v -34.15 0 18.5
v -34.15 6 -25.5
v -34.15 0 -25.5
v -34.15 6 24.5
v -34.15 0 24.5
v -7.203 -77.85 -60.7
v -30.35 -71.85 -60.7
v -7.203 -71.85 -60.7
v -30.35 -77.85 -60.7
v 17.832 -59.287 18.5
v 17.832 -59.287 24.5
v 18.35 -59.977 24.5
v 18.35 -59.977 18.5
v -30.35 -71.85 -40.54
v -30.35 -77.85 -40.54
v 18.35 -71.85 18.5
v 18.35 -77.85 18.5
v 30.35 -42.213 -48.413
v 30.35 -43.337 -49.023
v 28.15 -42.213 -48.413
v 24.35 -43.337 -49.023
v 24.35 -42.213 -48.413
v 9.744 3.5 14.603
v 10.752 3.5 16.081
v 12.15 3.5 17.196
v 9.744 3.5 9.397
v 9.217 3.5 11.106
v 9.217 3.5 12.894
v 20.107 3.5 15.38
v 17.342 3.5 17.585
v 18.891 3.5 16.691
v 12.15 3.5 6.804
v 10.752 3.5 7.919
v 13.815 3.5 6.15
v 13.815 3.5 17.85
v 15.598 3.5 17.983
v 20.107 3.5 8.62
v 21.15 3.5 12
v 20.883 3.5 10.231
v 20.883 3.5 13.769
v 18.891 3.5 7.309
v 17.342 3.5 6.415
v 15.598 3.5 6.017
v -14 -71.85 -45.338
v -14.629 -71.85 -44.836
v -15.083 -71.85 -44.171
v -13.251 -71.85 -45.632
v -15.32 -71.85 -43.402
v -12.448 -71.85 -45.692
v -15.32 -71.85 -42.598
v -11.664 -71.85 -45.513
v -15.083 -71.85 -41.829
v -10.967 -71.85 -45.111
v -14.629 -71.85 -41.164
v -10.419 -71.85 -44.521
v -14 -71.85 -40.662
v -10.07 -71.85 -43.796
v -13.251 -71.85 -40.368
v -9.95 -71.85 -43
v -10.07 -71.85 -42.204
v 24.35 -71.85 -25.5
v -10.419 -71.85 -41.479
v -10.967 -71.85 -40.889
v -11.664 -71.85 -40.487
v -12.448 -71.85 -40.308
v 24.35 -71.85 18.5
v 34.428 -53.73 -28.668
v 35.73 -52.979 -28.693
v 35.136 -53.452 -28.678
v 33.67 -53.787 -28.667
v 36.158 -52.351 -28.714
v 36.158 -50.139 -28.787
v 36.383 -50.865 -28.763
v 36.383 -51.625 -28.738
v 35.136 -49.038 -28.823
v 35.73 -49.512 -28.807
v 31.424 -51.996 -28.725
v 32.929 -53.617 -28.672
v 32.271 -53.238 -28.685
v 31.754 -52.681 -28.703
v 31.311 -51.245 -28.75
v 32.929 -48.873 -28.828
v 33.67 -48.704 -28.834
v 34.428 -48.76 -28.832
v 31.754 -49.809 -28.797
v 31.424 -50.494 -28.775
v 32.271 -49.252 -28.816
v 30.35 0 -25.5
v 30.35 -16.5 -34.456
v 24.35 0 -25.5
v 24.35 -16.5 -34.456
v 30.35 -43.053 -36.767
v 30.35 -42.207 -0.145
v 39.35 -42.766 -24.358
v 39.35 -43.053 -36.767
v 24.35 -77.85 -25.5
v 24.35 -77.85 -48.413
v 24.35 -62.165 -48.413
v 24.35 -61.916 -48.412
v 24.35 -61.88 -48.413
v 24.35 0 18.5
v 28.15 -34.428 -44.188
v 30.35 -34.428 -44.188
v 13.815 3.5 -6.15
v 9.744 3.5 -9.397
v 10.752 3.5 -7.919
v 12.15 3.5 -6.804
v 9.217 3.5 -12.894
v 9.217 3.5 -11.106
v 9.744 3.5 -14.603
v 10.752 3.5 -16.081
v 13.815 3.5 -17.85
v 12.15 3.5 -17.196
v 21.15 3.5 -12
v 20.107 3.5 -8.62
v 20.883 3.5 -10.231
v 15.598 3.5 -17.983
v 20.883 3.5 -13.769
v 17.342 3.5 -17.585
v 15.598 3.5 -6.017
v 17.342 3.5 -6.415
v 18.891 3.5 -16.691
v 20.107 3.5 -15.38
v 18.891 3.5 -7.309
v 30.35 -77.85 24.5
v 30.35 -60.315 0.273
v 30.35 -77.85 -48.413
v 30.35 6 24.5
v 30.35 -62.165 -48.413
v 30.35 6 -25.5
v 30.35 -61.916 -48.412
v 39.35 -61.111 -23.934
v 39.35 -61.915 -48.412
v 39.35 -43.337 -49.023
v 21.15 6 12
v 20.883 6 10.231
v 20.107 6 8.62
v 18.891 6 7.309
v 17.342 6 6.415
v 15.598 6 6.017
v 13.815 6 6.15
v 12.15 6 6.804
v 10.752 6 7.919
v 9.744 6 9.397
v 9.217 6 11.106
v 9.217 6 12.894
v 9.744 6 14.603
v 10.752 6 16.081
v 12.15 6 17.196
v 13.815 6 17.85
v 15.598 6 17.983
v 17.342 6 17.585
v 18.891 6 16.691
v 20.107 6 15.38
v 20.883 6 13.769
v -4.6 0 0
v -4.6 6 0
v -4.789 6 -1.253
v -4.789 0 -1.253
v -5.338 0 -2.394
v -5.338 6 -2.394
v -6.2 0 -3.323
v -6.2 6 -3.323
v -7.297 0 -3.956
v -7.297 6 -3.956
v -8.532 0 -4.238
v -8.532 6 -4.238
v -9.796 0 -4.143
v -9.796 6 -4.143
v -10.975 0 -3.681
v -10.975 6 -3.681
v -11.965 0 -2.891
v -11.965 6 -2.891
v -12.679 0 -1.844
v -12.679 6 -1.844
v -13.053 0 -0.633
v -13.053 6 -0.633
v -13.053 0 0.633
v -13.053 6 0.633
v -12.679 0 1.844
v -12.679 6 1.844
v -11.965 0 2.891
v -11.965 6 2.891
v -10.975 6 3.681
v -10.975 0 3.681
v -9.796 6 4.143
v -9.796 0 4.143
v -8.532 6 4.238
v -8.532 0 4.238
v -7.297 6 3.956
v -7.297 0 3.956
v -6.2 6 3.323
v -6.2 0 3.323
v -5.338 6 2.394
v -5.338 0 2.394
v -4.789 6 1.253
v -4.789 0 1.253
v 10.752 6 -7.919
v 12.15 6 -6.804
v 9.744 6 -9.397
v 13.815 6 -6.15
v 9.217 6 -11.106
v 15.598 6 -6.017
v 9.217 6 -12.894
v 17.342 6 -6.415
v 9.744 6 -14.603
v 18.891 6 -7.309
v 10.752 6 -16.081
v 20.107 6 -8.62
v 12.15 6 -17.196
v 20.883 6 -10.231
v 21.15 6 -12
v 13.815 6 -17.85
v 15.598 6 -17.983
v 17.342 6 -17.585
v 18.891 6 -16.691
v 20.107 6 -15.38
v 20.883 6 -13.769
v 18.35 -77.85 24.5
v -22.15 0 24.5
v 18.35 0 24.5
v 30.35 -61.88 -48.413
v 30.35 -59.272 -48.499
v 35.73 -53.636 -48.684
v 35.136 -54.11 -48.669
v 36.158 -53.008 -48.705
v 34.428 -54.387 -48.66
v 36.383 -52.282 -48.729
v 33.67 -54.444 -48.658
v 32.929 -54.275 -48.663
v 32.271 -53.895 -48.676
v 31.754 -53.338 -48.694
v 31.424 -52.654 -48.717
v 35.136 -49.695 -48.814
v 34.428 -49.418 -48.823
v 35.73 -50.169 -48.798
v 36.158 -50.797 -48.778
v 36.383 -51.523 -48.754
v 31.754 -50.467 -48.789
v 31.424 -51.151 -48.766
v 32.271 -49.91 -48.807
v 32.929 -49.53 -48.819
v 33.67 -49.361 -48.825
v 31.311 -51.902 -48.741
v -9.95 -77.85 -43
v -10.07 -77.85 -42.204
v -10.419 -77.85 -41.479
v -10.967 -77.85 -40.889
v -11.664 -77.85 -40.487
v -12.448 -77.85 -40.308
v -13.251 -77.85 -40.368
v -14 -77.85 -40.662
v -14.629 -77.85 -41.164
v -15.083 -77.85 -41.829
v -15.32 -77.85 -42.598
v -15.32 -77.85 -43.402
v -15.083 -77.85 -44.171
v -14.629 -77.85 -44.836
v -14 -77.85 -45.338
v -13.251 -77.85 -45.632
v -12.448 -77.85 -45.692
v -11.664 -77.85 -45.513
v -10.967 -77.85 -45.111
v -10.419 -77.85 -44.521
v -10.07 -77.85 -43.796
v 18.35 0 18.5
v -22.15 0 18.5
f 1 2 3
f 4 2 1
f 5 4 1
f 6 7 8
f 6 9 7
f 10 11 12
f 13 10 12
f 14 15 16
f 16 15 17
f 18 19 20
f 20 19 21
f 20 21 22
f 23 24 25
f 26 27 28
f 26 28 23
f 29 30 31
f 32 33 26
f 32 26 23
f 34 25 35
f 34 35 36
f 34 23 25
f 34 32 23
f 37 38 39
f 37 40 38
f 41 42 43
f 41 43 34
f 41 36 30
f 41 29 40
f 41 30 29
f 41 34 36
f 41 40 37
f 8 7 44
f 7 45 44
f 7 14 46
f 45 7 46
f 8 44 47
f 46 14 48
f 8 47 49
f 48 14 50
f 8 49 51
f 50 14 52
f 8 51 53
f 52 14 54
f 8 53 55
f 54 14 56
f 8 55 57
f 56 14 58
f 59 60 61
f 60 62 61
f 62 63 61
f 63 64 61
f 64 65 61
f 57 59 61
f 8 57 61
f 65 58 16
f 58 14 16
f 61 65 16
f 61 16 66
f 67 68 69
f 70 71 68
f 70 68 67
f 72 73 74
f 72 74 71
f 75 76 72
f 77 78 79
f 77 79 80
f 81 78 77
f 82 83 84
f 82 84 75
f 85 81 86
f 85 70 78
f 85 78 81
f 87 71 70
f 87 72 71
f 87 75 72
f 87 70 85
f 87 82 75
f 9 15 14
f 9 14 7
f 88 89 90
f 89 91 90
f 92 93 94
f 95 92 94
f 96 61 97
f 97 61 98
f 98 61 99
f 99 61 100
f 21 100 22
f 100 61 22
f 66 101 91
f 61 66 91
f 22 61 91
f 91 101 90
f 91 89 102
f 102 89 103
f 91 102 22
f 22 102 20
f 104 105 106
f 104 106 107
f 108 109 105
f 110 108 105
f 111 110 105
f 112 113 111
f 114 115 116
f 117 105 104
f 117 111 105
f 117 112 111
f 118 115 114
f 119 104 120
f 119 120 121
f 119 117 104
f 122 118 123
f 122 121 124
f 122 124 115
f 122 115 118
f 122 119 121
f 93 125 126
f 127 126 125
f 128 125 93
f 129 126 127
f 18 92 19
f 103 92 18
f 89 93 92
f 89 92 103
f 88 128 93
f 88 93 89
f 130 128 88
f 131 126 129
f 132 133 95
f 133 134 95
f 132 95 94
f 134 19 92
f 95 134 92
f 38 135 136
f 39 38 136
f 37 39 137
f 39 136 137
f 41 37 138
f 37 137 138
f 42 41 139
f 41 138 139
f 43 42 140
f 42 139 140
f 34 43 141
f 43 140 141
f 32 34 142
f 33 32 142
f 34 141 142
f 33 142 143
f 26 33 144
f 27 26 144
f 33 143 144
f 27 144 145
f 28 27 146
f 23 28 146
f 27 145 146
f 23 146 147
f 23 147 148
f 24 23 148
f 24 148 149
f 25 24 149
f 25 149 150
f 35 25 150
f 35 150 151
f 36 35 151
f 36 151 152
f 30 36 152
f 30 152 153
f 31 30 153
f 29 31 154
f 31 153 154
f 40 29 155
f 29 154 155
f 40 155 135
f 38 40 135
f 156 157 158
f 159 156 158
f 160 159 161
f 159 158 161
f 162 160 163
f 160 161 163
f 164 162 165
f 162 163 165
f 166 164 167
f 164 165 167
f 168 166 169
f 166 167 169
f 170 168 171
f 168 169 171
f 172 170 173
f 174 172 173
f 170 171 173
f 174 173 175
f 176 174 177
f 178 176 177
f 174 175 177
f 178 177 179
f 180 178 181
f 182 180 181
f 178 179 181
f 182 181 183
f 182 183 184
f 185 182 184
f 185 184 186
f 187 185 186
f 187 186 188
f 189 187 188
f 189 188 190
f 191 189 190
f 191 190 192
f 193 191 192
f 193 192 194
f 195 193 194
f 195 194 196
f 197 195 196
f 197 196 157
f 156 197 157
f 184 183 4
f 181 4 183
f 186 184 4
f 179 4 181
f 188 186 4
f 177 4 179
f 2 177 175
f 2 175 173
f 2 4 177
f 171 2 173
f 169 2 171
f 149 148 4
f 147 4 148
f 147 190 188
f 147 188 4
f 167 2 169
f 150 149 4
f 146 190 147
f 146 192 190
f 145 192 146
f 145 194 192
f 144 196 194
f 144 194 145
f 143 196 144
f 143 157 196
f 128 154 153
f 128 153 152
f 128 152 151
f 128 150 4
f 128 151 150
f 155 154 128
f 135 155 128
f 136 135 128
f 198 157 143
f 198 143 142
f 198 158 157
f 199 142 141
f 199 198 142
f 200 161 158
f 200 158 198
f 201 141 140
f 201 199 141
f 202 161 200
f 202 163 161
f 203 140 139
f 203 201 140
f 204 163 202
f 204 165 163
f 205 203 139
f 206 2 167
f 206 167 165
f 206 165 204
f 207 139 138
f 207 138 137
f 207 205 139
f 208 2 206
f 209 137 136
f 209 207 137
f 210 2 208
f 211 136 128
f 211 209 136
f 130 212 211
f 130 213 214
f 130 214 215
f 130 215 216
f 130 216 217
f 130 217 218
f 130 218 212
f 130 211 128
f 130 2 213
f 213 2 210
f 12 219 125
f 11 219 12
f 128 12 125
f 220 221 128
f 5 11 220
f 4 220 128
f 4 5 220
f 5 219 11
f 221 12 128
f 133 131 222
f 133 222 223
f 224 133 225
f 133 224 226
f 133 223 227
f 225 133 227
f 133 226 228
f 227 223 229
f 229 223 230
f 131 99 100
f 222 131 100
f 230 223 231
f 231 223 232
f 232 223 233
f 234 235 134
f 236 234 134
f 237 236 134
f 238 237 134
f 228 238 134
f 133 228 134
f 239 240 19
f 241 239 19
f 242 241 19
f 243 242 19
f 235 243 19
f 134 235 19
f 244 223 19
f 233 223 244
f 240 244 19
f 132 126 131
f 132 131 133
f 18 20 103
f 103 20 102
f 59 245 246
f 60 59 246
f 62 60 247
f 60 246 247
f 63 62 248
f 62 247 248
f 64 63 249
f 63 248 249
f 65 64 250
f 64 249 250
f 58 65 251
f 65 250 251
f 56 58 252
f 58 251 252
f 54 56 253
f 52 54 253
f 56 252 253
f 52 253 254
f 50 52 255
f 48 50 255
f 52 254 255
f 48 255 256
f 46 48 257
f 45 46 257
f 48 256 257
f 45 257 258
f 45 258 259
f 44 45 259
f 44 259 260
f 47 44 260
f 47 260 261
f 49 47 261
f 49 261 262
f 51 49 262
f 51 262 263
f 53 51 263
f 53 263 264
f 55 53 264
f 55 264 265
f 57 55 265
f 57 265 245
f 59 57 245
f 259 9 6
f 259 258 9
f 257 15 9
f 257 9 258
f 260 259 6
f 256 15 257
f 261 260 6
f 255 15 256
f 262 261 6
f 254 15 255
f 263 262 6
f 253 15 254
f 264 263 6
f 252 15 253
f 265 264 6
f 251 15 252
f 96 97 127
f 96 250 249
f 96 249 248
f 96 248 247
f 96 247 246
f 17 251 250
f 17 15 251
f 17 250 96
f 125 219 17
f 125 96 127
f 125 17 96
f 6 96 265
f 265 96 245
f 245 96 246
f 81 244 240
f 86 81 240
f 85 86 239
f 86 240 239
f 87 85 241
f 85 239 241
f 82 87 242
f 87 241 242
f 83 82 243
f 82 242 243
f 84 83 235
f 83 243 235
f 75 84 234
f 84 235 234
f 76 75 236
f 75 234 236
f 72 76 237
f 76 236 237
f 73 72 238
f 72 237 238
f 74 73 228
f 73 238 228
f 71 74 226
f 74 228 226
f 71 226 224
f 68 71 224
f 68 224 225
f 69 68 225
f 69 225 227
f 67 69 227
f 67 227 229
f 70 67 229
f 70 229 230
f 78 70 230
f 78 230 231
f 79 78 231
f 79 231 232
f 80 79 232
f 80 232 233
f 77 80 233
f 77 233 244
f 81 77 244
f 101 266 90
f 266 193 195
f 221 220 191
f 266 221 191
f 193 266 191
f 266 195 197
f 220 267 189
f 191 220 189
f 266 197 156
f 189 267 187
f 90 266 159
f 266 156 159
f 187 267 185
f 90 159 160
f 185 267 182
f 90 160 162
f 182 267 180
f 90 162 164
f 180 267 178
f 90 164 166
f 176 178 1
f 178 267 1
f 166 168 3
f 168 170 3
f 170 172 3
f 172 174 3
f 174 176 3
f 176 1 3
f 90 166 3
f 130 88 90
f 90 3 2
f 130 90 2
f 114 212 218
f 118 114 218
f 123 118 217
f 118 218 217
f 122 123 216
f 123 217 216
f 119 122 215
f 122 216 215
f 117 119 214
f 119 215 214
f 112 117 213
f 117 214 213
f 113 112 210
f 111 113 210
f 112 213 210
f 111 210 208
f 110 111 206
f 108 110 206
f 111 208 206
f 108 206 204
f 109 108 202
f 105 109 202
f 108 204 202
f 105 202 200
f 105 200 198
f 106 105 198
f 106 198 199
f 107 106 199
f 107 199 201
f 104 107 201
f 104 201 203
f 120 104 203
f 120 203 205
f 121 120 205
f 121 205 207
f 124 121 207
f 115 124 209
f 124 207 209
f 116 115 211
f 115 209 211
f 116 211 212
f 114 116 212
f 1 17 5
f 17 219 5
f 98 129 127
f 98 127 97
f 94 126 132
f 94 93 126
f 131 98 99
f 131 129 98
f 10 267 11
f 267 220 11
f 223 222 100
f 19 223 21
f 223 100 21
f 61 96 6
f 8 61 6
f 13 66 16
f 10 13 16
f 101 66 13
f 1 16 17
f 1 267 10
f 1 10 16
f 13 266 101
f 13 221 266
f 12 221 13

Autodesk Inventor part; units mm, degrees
ref_plane "YZ Plane" through (0, 0, 0) normal (1, 0, 0) x (0, 1, 0)
ref_plane "XZ Plane" through (0, 0, 0) normal (0, 1, 0) x (-1, 0, 0)
ref_plane "XY Plane" through (0, 0, 0) normal (0, 0, 1) x (1, 0, 0)
sketch "Sketch1" plane through (0, 0, 0) normal (0, 1, 0) x (-1, 0, 0)
  line L0 (0, -25.5) -> (-34.15, -25.5)
  line L1 (-34.15, -25.5) -> (-34.15, 0)
  line L2 (-34.15, 0) -> (-34.15, 25.5)
  line L3 (-34.15, 25.5) -> (0, 25.5)
  line L4 (0, 25.5) -> (34.15, 25.5)
  line L5 (34.15, 25.5) -> (34.15, 0)
  line L6 (34.15, 0) -> (34.15, -25.5)
  line L7 (34.15, -25.5) -> (0, -25.5)
  point P0 (0, 0)
extrude "Extrusion1" add sketch "Sketch1" along normal blind 7
sketch "Sketch3" plane through (-34.15, 0, 25.5) normal (0, 0, 1) x (1, 0, 0)
  line L0 (0, 0) -> (0, -78.85)
  point P0 (34.15, 0)
  dimension "d7" = 78.85
sketch "Sketch4" plane through (-34.15, 0, -25.5) normal (-1, 0, 0) x (0, 0, 1)
  line L0 (51, 0) -> (51, -78.85)
  line L1 (51, -78.85) -> (-39, -78.85)
  line L2 (-39, -78.85) -> (-39, -71.85)
  line L3 (0, 0) -> (-39, -71.85)
  line L4 (0, 0) -> (51, 0)
  point P0 (25.5, 0)
  dimension "d10" = 90
  dimension "d11" = 7
extrude "Extrusion2" add sketch "Sketch4" against normal blind 7
sketch "Sketch7" plane through (-27.15, 0, -25.5) normal (1, 0, 0) x (0, 0, -1)
  line L0 (-51, -78.85) -> (39, -78.85) projected
  line L1 (-51, -78.85) -> (39, -78.85)
  line L2 (39, -78.85) -> (39, -71.85) projected
  line L3 (39, -78.85) -> (39, -71.85)
  line L4 (39, -71.85) -> (-51, -71.85)
  line L5 (-51, 0) -> (-51, -78.85) projected
  line L6 (-51, -78.85) -> (-51, -71.85)
  point P0 (-25.5, 0)
sketch "Sketch8" plane through (0, 0, 0) normal (0, -1, 0) x (1, 0, 0)
  circle A0 centre (8.15, 0) radius 5 projected
  line L0 (8.15, 18.5) -> (34.15, 18.5)
  line L1 (34.15, 25.5) -> (34.15, -25.5) projected
  line L2 (8.15, 25.5) -> (34.15, 25.5)
  line L3 (8.15, 25.5) -> (-27.15, 25.5)
  line L4 (-27.15, 25.5) -> (-27.15, -25.5) projected
  line L5 (8.15, 18.5) -> (-27.15, 18.5)
  line L6 (34.15, 25.5) -> (34.15, 18.5)
  line L7 (-27.15, 25.5) -> (-27.15, 18.5)
  point P0 (0, 0)
extrude "Extrusion6" add sketch "Sketch7" along normal blind 58.5
extrude "Extrusion7" add sketch "Sketch8" along normal blind 78.75 contours L5 L4 L3 L2 L1 L0
sketch "Sketch9" plane through (31.35, 0, -25.5) normal (1, 0, 0) x (0, 0, -1)
  line L0 (-51, -78.75) -> (-51, 7) projected
  line L1 (-44, 0) -> (-44, -71.85) projected
  line L2 (-51, -78.75) -> (-44, -78.75)
  line L3 (-44, -78.75) -> (-44, -71.85)
  line L4 (-44, -71.85) -> (-51, -71.85)
  line L5 (-51, -71.85) -> (-51, -78.75)
  point P0 (-25.5, 0)
extrude "Extrusion8" cut sketch "Sketch9" along normal blind 10
sketch "Sketch10" plane through (0, 7, 0) normal (0, 1, 0) x (1, 0, 0)
  point P0 (0, 0)
sketch "Boceto11" plane through (-34.15, -78.85, -64.5) normal (0, -1, 0) x (1, 0, 0)
  line L0 (0, 0) -> (65.5, 0) projected
  line L1 (65.5, 89.9985) -> (65.5, 0)
  line L2 (65.5, 0) -> (71.065, 0)
  line L3 (71.065, 0) -> (71.065, 89.9985)
  line L4 (71.065, 89.9985) -> (65.5, 89.9985)
  line L5 (65.5, 89.9985) -> (65.5, 95.8996)
  line L6 (65.5, 95.8996) -> (71.065, 89.9985)
  point P0 (34.15, 64.5)
extrude "Extrusión9" cut sketch "Boceto11" against normal blind 100
sketch "Boceto12" plane through (31.35, 0, -25.5) normal (1, 0, 0) x (0, 0, -1)
  line L0 (-44, 0) -> (-44, -71.85) projected
  line L1 (-44, 0) -> (-44, -71.85)
  line L2 (39, -71.85) -> (39, -78.85) projected
  line L3 (-44, -71.85) -> (39, -71.85)
  line L4 (-44, 0) -> (0, 0) projected
  line L5 (39, -71.85) -> (0, 0)
  line L6 (0, 0) -> (-44, 0)
  point P0 (-25.5, 0)
extrude "Extrusión10" add sketch "Boceto12" against normal blind 7
sketch "Boceto13" plane through (-34.15, 7, -25.5) normal (-1, 0, 0) x (0, 0, 1)
  line L0 (0, -7) -> (0, 0) projected
  line L1 (44, -7) -> (0, -7) projected
  line L2 (0, -7) -> (44, -7)
  line L3 (44, -78.85) -> (-39, -78.85) projected
  line L4 (44, -7) -> (44, -78.85)
  line L5 (44, -78.85) -> (-39, -78.85)
  line L6 (-39, -78.85) -> (0, -7)
  point P0 (25.5, -7)
extrude "Extrusión11" cut sketch "Boceto13" against normal blind 7
sketch "Boceto15" plane through (-34.15, 0, -25.5) normal (0, 0, -1) x (-1, 0, 0)
  point P0 (-34.15, 0)
sketch "Boceto19" plane through (-34.15, -78.85, -64.5) normal (0, -1, 0) x (1, 0, 0)
  line L0 (65.5, 90) -> (65.5, 0) projected
  line L1 (65.5, 0) -> (65.5, 40.9323)
  line L2 (81.7334, 40.9323) -> (65.5, 40.9323)
  line L3 (81.7334, 40.9323) -> (81.7334, 0)
  line L4 (81.7334, 0) -> (65.5, 0)
  point P0 (34.15, 64.5)
extrude "Extrusión17" cut sketch "Boceto19" against normal blind 100
sketch "Boceto20" plane through (24.35, 0, -25.5) normal (-1, 0, 0) x (0, 0, 1)
  line L0 (-29.1839, -53.7657) -> (-27.9516, -53.3206) projected
  line L1 (0, 0) -> (-39, -71.85) projected
  line L2 (-29.1839, -53.7657) -> (-27.8697, -51.3447)
  line L3 (-27.8697, -51.3447) -> (-27.9516, -53.3206) projected
  line L4 (-27.8697, -51.3447) -> (-27.9516, -53.3206)
  line L5 (-27.9516, -53.3206) -> (-29.1839, -53.7657)
  point P0 (25.5, 0)
extrude "Extrusión18" add sketch "Boceto20" against normal blind 7
sketch "Boceto21" plane through (24.35, 0, -25.5) normal (-1, 0, 0) x (0, 0, 1)
  point P0 (25.5, 0)
sketch "Boceto22" plane through (24.35, 0, -25.5) normal (-1, 0, 0) x (0, 0, 1)
  point P0 (25.5, 0)
sketch "Boceto24" plane through (31.35, 0, -25.5) normal (1, 0, 0) x (0, 0, -1)
  point P0 (-25.5, 0)
sketch "Boceto26" plane through (24.35, 0, -25.5) normal (-1, 0, 0) x (0, 0, 1)
  point P0 (25.5, 0)
sketch "Boceto27" plane through (31.35, 0, -25.5) normal (1, 0, 0) x (0, 0, -1)
  line L0 (-51, 7) -> (0, 7) projected
  line L1 (0, 7) -> (16.0227, 7)
  line L2 (16.0227, 7) -> (16.0227, -29.5187)
  line L3 (0, 0) -> (39, -71.85) projected
  line L4 (16.0227, -29.5187) -> (0, 0)
  line L5 (0, 0) -> (0, 7)
  point P0 (-25.5, 0)
extrude "Extrusión22" add sketch "Boceto27" against normal blind 7
sketch "Boceto28" plane through (24.35, 0, -25.5) normal (-1, 0, 0) x (0, 0, 1)
  line L0 (-16.0227, -29.5187) -> (-39, -71.85) projected
  line L1 (-16.0227, -29.5187) -> (0, 0)
  line L2 (0, 7) -> (-16.0227, 7) projected
  line L3 (0, 0) -> (0, 7)
  line L4 (0, 7) -> (-16.0227, 7)
  line L5 (-16.0227, 7) -> (-16.0227, -29.5187) projected
  line L6 (-16.0227, 7) -> (-16.0227, -29.5187)
  point P0 (25.5, 0)
extrude "Extrusión23" cut sketch "Boceto28" against normal blind 7
sketch "Boceto29" plane through (31.35, 0, -25.5) normal (1, 0, 0) x (0, 0, -1)
  point P0 (-25.5, 0)
sketch "Boceto31" plane through (-34.15, -78.85, -64.5) normal (0, 0, -1) x (-1, 0, 0)
  line L0 (0, 7) -> (0, 0) projected
  line L1 (0, 0) -> (0, 1)
  line L2 (0, 1) -> (-65.5, 1)
  line L3 (-65.5, 0) -> (-65.5, 85.85) projected
  line L4 (-65.5, 1) -> (-64.5, 1)
  line L5 (-64.5, 1) -> (-64.5, 85.85)
  line L6 (0, 85.85) -> (-65.5, 85.85) projected
  line L7 (-64.5, 85.85) -> (0, 85.85)
  line L8 (0, 85.85) -> (0, 84.85)
  line L9 (0, 0) -> (0, 85.85) projected
  line L10 (0, 84.85) -> (-64.5, 84.85)
  line L11 (-64.5, 85.85) -> (-65.5, 85.85)
  line L12 (0, 0) -> (-65.5, 0) projected
  line L13 (-65.5, 85.85) -> (-65.5, 0)
  line L14 (-65.5, 0) -> (0, 0)
  point P0 (-34.15, 78.85)
  dimension "d84" = 1
  dimension "d85" = 1
  dimension "d86" = 1
extrude "Extrusión26" cut sketch "Boceto31" against normal blind 1000 contours L0 L12 L3 L2 | L10 L5 L6 L8 | L2 L3 L6 L5
sketch "Boceto32" plane through (-34.15, -71.85, 18.5) normal (-1, 0, 0) x (0, 0, 1)
  line L0 (-83, -6) -> (7, -6) projected
  line L1 (7, -6) -> (6, -6)
  line L2 (6, -6) -> (6, 77.85)
  line L3 (7, 77.85) -> (-44, 77.85) projected
  line L4 (7, -6) -> (7, 77.85) projected
  line L5 (6, 77.85) -> (7, 77.85)
  line L6 (7, 77.85) -> (7, -6)
  point P0 (-18.5, 71.85)
  dimension "d89" = 1
extrude "Extrusión27" cut sketch "Boceto32" against normal blind 100
sketch "Boceto33" plane through (-34.15, 6, -25.5) normal (0, 1, 0) x (1, 0, 0)
  line L0 (0, 0) -> (0, -44) projected
  line L1 (0, 0) -> (0, -25.5)
  line L2 (0, -25.5) -> (25.3, -25.5)
  circle A0 centre (25.3, -25.5) radius 4.25
  point P0 (34.15, -25.5)
  dimension "d92" = 25.5
  dimension "d93" = 25.3
  dimension "d94" = 8.5
extrude "Extrusión28" cut sketch "Boceto33" against normal blind 10
sketch "Boceto34" plane through (30.35, -77.85, -64.5) normal (1, 0, 0) x (0, 0, -1)
  point P0 (-64.5, 77.85)
sketch "Boceto35" plane through (30.35, -77.85, -64.5) normal (1, 0, 0) x (0, 0, -1)
  circle A0 centre (-24.4828, 41.285) radius 2.6
  point P0 (-64.5, 77.85)
  dimension "d101" = 5.2
extrude "Extrusión29" cut sketch "Boceto35" against normal blind 10
sketch "Boceto36" plane through (30.35, -77.85, -64.5) normal (1, 0, 0) x (0, 0, -1)
  point P0 (-64.5, 77.85)
sketch "Boceto37" plane through (30.35, -77.85, -64.5) normal (1, 0, 0) x (0, 0, -1)
  line L0 (-39, 77.85) -> (0, 6) projected
  line L1 (-12.3437, 28.741) -> (-12.3437, 48.1268)
  line L2 (-12.3437, 48.1268) -> (-28.4038, 58.3285)
  line L3 (-12.3437, 28.741) -> (-28.4038, 58.3285)
  point P0 (-64.5, 77.85)
extrude "Extrusión30" add sketch "Boceto37" against normal blind 6
fillet "Empalme3" radius 10 3 edges at (27.35, -29.7232, -52.1563) (27.35, -49.109, -52.1563) (27.35, -19.5215, -36.0962)
sketch "Boceto38" plane through (30.35, -77.85, -64.5) normal (1, 0, 0) x (0, 0, -1)
  point P0 (-64.5, 77.85)
sketch "Boceto39" plane through (30.35, -77.85, -64.5) normal (1, 0, 0) x (0, 0, -1)
  line L0 (-6.8274, 18.5782) -> (-18.8698, 18.5782)
  line L1 (-18.8698, 18.5782) -> (-18.2969, 35.7502)
  line L2 (-18.2969, 35.7502) -> (-20.685, 39.2299)
  line L3 (-20.685, 39.2299) -> (-19.4909, 52.6668)
  line L4 (-26.2143, 56.9377) -> (-16.9818, 51.073) projected
  line L5 (-6.8274, 18.5782) -> (-5.5662, 48.0514)
  line L6 (-5.5662, 48.0514) -> (-19.4909, 52.6668)
  point P0 (-64.5, 77.85)
extrude "Extrusión31" cut sketch "Boceto39" against normal blind 2.2
fillet "Empalme4" radius 10 1 edges at (29.25, -25.1832, -45.0091)
sketch "Boceto40" plane through (24.35, 0, -25.5) normal (-1, 0, 0) x (0, 0, 1)
  line L0 (-26.6563, -35.218) -> (-26.6563, -46.57) projected
  line L1 (-26.6563, -35.218) -> (-24.0221, -30.4862) construction
  arc A0 (-12.7857, -20.9123) -> (-9.3588, -17.2419) centre (-18.1476, -12.4713) ccw projected
  line L2 (-24.0221, -30.4862) -> (-10.7107, -19.1566) construction
  spline S0 degree 2 poles (-26.6563, -35.218) (-24.0221, -30.4862) (-10.7107, -19.1566) knots 1 1 1 2 2 2
  line L3 (-26.6563, -35.218) -> (-10.7107, -35.218)
  line L4 (-10.7107, -35.218) -> (-10.7107, -19.1566)
  line L5 (-10.7107, -19.1566) -> (-26.6563, -19.1566)
  line L6 (-26.6563, -19.1566) -> (-26.6563, -35.218)
  point P0 (25.5, 0)
  point P1 (-10.7107, -19.1566)
extrude "Extrusión32" cut sketch "Boceto40" against normal blind 6 contours S0 L6 L5
fillet "Empalme5" radius 10 1 edges at (26.25, -35.218, -52.1563)
sketch "Boceto41" plane through (-34.15, -71.85, 18.5) normal (0, 1, 0) x (1, 0, 0)
  circle A0 centre (11.5, 71.5) radius 5 projected
  circle A1 centre (11.5, 71.5) radius 6
  line L0 (11.5, 71.5) -> (-12.5, 71.5)
  line L1 (-12.5, 71.5) -> (-12.5, 95.5)
  line L2 (-12.5, 95.5) -> (11.5, 95.5)
  line L3 (11.5, 95.5) -> (11.5, 71.5)
  line L4 (64.5, 76.1726) -> (64.5, 83) projected
  line L5 (64.5, 83) -> (64.5, 95.5)
  line L6 (64.5, 95.5) -> (11.5, 95.5)
  line L7 (0, 83) -> (0, -6) projected
  line L8 (0, -6) -> (-12.5, -6)
  line L9 (-12.5, -6) -> (-12.5, 71.5)
  line L10 (64.5, 83) -> (11.5, 83)
  line L11 (0, 83) -> (58.5, 83) projected
  point P0 (34.15, 18.5)
  dimension "d113" = 12
  dimension "d114" = 24
  dimension "d115" = 24
extrude "Extrusión33" add sketch "Boceto41" against normal blind 6 contours L11 L7 L0 L1 L2 L3 | L3 L6 L5 L10 | L7 L8 L9 L0
sketch "Boceto43" plane through (30.35, 6, 24.5) normal (0, 1, 0) x (1, 0, 0)
  circle A0 centre (-39.2, 24.5) radius 4.25 projected
  line L0 (-39.2, 24.5) -> (-15.2, 24.5)
  line L1 (-15.2, 24.5) -> (-15.2, 12.5)
  line L2 (-15.2, 12.5) -> (-15.2, 36.5)
  circle A1 centre (-15.2, 36.5) radius 6
  circle A2 centre (-15.2, 12.5) radius 6
  point P0 (-30.35, 24.5)
  dimension "d123" = 24
  dimension "d124" = 12
  dimension "d125" = 24
  dimension "d126" = 12
  dimension "d127" = 12
extrude "Extrusión35" cut sketch "Boceto43" against normal blind 2.5 contours A1 | A2
sketch "Boceto44" plane through (24.35, 0, -25.5) normal (-1, 0, 0) x (0, 0, 1)
  line L0 (0, 0) -> (-9.3588, -17.2419) projected
  line L1 (-9.3588, -17.2419) -> (-30.5215, -33.5874)
  line L2 (-30.5215, -33.5874) -> (-30.5215, -56.2301)
  line L3 (-27.8675, -51.3405) -> (-39, -71.85) projected
  arc A0 (-12.666, -20.8351) -> (-9.3588, -17.2419) centre (-18.1476, -12.4713) ccw projected
  line L4 (-30.5215, -56.2301) -> (-9.3588, -17.2419)
  point P0 (25.5, 0)
extrude "Extrusión36" add sketch "Boceto44" against normal blind 6
sketch "Boceto45" plane through (30.35, 0, -25.5) normal (1, 0, 0) x (0, 0, -1)
  line L0 (18.315, -38.6201) -> (18.6875, -34.4282) projected
  line L1 (18.6875, -34.4282) -> (19.9402, -25.4146)
  line L2 (9.3588, -17.2419) -> (30.5215, -33.5874) projected
  line L3 (30.5215, -56.2301) -> (30.5215, -33.5874) projected
  line L4 (19.9402, -25.4146) -> (30.5215, -33.5874)
  line L5 (30.5215, -33.5874) -> (32.1519, -59.2336)
  line L6 (30.5215, -56.2301) -> (39, -71.85) projected
  line L7 (32.1726, -59.2718) -> (20.1302, -59.2718) projected
  line L8 (32.1726, -59.2718) -> (18.315, -38.6201)
  point P0 (-25.5, 0)
extrude "Extrusión37" cut sketch "Boceto45" against normal blind 2.2 contours L0 L1 L2 L3 L6 L8
fillet "Empalme7" radius 4 3 edges at (26.25, -33.5874, -56.0215) (27.35, -17.2419, -34.8588) (26.25, -56.2301, -56.0215)
sketch "Boceto46" plane through (-34.15, -71.85, 18.5) normal (0, 1, 0) x (1, 0, 0)
  line L0 (-12.5, -6) -> (0, -6) projected
  line L1 (0, -6) -> (0, 95.5)
  line L2 (-12.5, 95.5) -> (64.5, 95.5) projected
  line L3 (0, 95.5) -> (-12.5, 95.5)
  line L4 (-12.5, 95.5) -> (-12.5, -6)
  line L5 (-12.5, -6) -> (0, -6)
  point P0 (34.15, 18.5)
extrude "Extrusión38" cut sketch "Boceto46" against normal blind 10
sketch "Boceto47" plane through (-34.15, -71.85, 18.5) normal (0, 1, 0) x (1, 0, 0)
  line L0 (0, 0) -> (0, -6) projected
  line L1 (0, 95.5) -> (26.5, 95.5)
  line L2 (26.5, 95.5) -> (26.5, 69)
  line L3 (26.5, 69) -> (0, 69)
  line L4 (0, 69) -> (0, 95.5)
  circle A0 centre (26.5, 69) radius 6
  point P0 (34.15, 18.5)
  dimension "d137" = 26.5
  dimension "d138" = 26.5
  dimension "d139" = 12
extrude "Extrusión39" cut sketch "Boceto47" against normal blind 10 contours A0 L3 L2 | L2 L3 A0
sketch "Sketch48" plane through (-34.15, -71.85, 18.5) normal (0, 1, 0) x (1, 0, 0)
  circle A0 centre (26.5, 69) radius 6 projected
  line L0 (29.7126, 74.0675) -> (26.5, 69)
  circle A1 centre (26.5, 69) radius 18
  line L1 (8.5, 69) -> (8.5, 0)
  line L2 (0, 0) -> (58.5, 0) projected
  line L3 (0, 0) -> (8.5, 0)
  line L4 (26.5, 87) -> (64.5, 87)
  line L5 (64.5, 83) -> (64.5, 95.5) projected
  line L6 (0, 0) -> (0, 95.5) projected
  line L7 (64.5, 95.5) -> (0, 95.5)
  line L8 (0, 95.5) -> (0, 0)
  point P0 (34.15, 18.5)
  dimension "d142" = 36
extrude "Extrusion40" cut sketch "Sketch48" against normal blind 10 contours A1 L1 L2 L6 L7 L5 L4
sketch "Sketch49" plane through (24.35, 0, 18.5) normal (0, 0, -1) x (-1, 0, 0)
  line L0 (58.5, -77.85) -> (50, -77.85) projected
  line L1 (58.5, -77.85) -> (50, -77.85)
  line L2 (50, -71.85) -> (0, -71.85) projected
  line L3 (50, -77.85) -> (50, -71.85)
  line L4 (50, -71.85) -> (58.5, -71.85)
  line L5 (58.5, -71.85) -> (58.5, -77.85)
  point P0 (24.35, 0)
extrude "Extrusion41" add sketch "Sketch49" along normal blind 20
fillet "Fillet8" radius 7 1 edges at (-34.15, -74.85, -1.5)
fillet "Fillet9" radius 2 1 edges at (-25.65, -74.85, -1.5)
sketch "Sketch50" plane through (28.15, -77.85, -64.5) normal (1, 0, 0) x (0, 0, -1)
  point P0 (-64.5, 77.85)
sketch "Sketch51" plane through (-34.15, -77.85, 24.5) normal (0, -1, 0) x (1, 0, 0)
  line L0 (64.5, -50) -> (64.5, 0) projected
  line L1 (64.5, 0) -> (-39.5, 0)
  line L2 (-39.5, 0) -> (-39.5, -120)
  line L3 (-39.5, -120) -> (64.5, -120)
  line L4 (64.5, -120) -> (64.5, 0)
  point P0 (34.15, -24.5)
  dimension "d149" = 104
  dimension "d150" = 120
sketch "Sketch52" plane through (30.35, 0, -25.5) normal (1, 0, 0) x (0, 0, -1)
  line L0 (0, 0) -> (-44, 0) projected
  line L1 (32.1726, -59.2718) -> (39, -71.85) projected
  line L2 (0, 0) -> (39, -71.85)
  line L3 (22.9041, -62.1597) -> (23.523, -43.3366)
  line L4 (22.9041, -62.1597) -> (39, -71.85)
  line L5 (39, -71.85) -> (32.1726, -12.8018)
  line L6 (0, 0) -> (0, 6) projected
  line L7 (32.1726, -12.8018) -> (0, 0)
  point P0 (-25.5, 0)
extrude "Extrusion42" cut sketch "Sketch52" against normal blind 10
sketch "Sketch53" plane through (28.15, -77.85, -64.5) normal (1, 0, 0) x (0, 0, -1)
  line L0 (-16.0959, 15.6903) -> (0, 6) projected
  line L1 (-16.001, 18.5782) -> (-15.477, 34.5134) projected
  line L2 (-16.0959, 15.6903) -> (-15.477, 34.5134)
  line L3 (-15.477, 34.5134) -> (-20.7531, 44.2336)
  line L4 (-39, 77.85) -> (-15.477, 34.5134) projected
  line L5 (-20.7531, 44.2336) -> (-21.8828, 18.4708)
  line L6 (-21.8828, 18.4708) -> (-16.0045, 18.4708)
  point P0 (-64.5, 77.85)
extrude "Extrusion43" add sketch "Sketch53" along normal blind 2.2
sketch "Sketch54" plane through (30.35, 0, -25.5) normal (1, 0, 0) x (0, 0, -1)
  circle A0 centre (14.5172, -36.565) radius 2.6 projected
  circle A1 centre (14.5172, -36.565) radius 2.6
  point P0 (-25.5, 0)
extrude "Extrusion44" add sketch "Sketch54" against normal blind 6
sketch "Sketch55" plane through (30.35, 0, -25.5) normal (1, 0, 0) x (0, 0, -1)
  line L0 (39, -71.85) -> (22.9041, -62.1597) projected
  line L1 (22.9041, -62.1597) -> (13.9423, -61.864)
  line L2 (22.9041, -62.1597) -> (23.523, -43.3366) projected
  line L3 (19.528, -36.1291) -> (23.523, -43.3366)
  line L4 (22.9041, -62.1597) -> (23.523, -43.3366)
  line L5 (5.6191, -42.216) -> (13.9423, -61.864)
  line L6 (5.6191, -42.216) -> (19.528, -36.1291)
  point P0 (-25.5, 0)
sketch "Sketch56" plane through (24.35, 0, -25.5) normal (-1, 0, 0) x (0, 0, 1)
  line L0 (-22.9041, -62.1597) -> (-23.523, -43.3366) projected
  line L1 (-23.523, -43.3366) -> (-22.9041, -62.1597)
  line L2 (-22.9041, -62.1597) -> (-10.8346, -61.7628)
  line L3 (-10.8346, -61.7628) -> (-11.7615, -21.6683)
  line L4 (0, 0) -> (-23.523, -43.3366) projected
  line L5 (-23.523, -43.3366) -> (-11.2671, -43.0533)
  line L6 (-23.523, -43.3366) -> (-22.9041, -62.1597)
  line L7 (-22.9041, -62.1597) -> (-10.8346, -61.7628)
  line L8 (-10.8346, -61.7628) -> (-11.2671, -43.0533)
  line L9 (-11.2671, -43.0533) -> (-23.523, -43.3366)
  point P0 (25.5, 0)
extrude "Extrusion45" add sketch "Sketch56" against normal blind 15 contours L0 L5 L3 L2
sketch "Sketch57" plane through (39.35, -43.3366, -49.023) normal (0, -0.0328631, -0.9994599) x (-1, 0, 0)
  line L0 (0.989, -8.5704) -> (9.989, -8.5704)
  line L1 (9, 46.8938) -> (9, -36.911) projected
  circle A0 centre (5.489, -8.5704) radius 2.55
  line L2 (5.489, -8.5704) -> (0.989, -8.5704)
  line L3 (5.489, -8.5704) -> (-0.011, -8.5704)
  point P0 (39.35, 41.7021)
  dimension "d218" = 5.5
  dimension "d219" = 5.1
extrude "Extrusion46" cut sketch "Sketch57" against normal blind 15
sketch "Sketch58" plane through (39.35, 0, -25.5) normal (1, 0, 0) x (0, 0, -1)
  point P0 (-25.5, 0)
sketch "Sketch59" plane through (30.35, -43.0533, -36.7671) normal (0, 0.9997329, -0.0231118) x (1, 0, 0)
  line L0 (9, 0) -> (9, 12.0754) projected
  line L1 (0, 32.5286) -> (0, -60.4465) projected
  line L2 (9, 0) -> (0, 0)
  line L3 (0, 0) -> (0, -12.412)
  line L4 (0, -12.412) -> (9, -12.412)
  line L5 (9, -12.412) -> (9, 0)
  line L6 (0, -12.412) -> (0, -36.6315)
  line L7 (0, -36.6315) -> (9, -12.412)
  point P0 (-30.35, -37.7523)
extrude "Extrusion47" add sketch "Sketch59" against normal blind 18.7159
sketch "Sketch60" plane through (30.35, 0, -25.5) normal (1, 0, 0) x (0, 0, -1)
  line L0 (22.9041, -62.1597) -> (10.8346, -61.7628) projected
  line L1 (22.9041, -62.1597) -> (-35.3443, -60.8131)
  line L2 (10.8346, -61.7642) -> (-25.7871, -60.9175) projected
  line L3 (-35.3443, -60.8131) -> (-11.8971, -71.85)
  line L4 (-44, -71.85) -> (39, -71.85) projected
  line L5 (22.9041, -62.1597) -> (-11.8971, -71.85)
  point P0 (-25.5, 0)
extrude "Extrusion48" cut sketch "Sketch60" along normal blind 18.7159
sketch "Sketch61" plane through (39.35, -43.3366, -49.023) normal (0, -0.0328631, -0.9994599) x (-1, 0, 0)
  point P0 (39.35, 41.7021)
sketch "Sketch62" plane through (39.35, -43.3366, -49.023) normal (0, -0.0328631, -0.9994599) x (-1, 0, 0)
  line L0 (9, -18.8333) -> (9, -18.8346) projected
  line L1 (9, -18.8346) -> (-1.0251, -18.8346)
  line L2 (-1.0251, -18.8346) -> (-1.0251, -24.5564)
  line L3 (-1.0251, -24.5564) -> (9, -24.5564)
  line L4 (9, -24.5564) -> (9, -18.8346)
  point P0 (39.35, 41.7021)
extrude "Extrusion49" cut sketch "Sketch62" against normal blind 100
sketch "Sketch63" plane through (39.35, -43.3366, -49.023) normal (0, -0.0328631, -0.9994599) x (-1, 0, 0)
  line L0 (9, 46.8938) -> (9, -36.911) projected
  line L1 (9, -18.5889) -> (-0.3497, -18.5889)
  line L2 (-0.3497, -18.5889) -> (-0.3497, -22.6635)
  line L3 (-0.3497, -22.6635) -> (9, -22.6635)
  line L4 (9, -22.6635) -> (9, -18.5889)
  point P0 (39.35, 41.7021)
  point P1 (9, -22.6635)
extrude "Extrusion50" cut sketch "Sketch63" against normal blind 100
sketch "Sketch64" plane through (-34.15, 6, -25.5) normal (0, 1, 0) x (1, 0, 0)
  line L0 (58.5, -44) -> (58.5, 39) projected
  line L1 (58.5, 23.5443) -> (58.5, 43.0724)
  line L2 (58.5, 43.0724) -> (64.7623, 43.0724)
  line L3 (64.7623, 43.0724) -> (64.7623, 23.523)
  line L4 (64.5, 23.523) -> (73.5, 23.523) projected
  line L5 (58.5, 23.523) -> (64.5, 23.523) projected
  line L6 (58.5, 23.523) -> (64.7623, 23.523)
  point P0 (34.15, -25.5)
extrude "Extrusion51" cut sketch "Sketch64" against normal blind 100
sketch "Sketch65" plane through (-34.15, 6, -25.5) normal (0, 1, 0) x (1, 0, 0)
  point P0 (34.15, -25.5)
sketch "Sketch66" plane through (-34.15, -77.85, 24.5) normal (0, -1, 0) x (1, 0, 0)
  line L0 (64.5, -73.523) -> (64.5, 0) projected
  line L1 (64.5, -72.9133) -> (58.4721, -72.9133)
  line L2 (58.4721, -72.9133) -> (58.4721, -73.523)
  line L3 (58.4721, -73.523) -> (64.5, -73.523)
  line L4 (64.5, -73.523) -> (64.5, -72.9133)
  point P0 (34.15, -24.5)
extrude "Extrusion52" cut sketch "Sketch66" against normal blind 100
sketch "Sketch67" plane through (24.35, 0, -25.5) normal (-1, 0, 0) x (0, 0, 1)
  line L0 (-22.9121, -61.9155) -> (-23.523, -43.3366) projected
  line L1 (-22.9121, -61.9155) -> (-23.523, -43.3366)
  line L2 (-22.9133, -43.3225) -> (-22.9133, -42.2133) projected
  line L3 (-23.523, -43.3366) -> (-22.9133, -42.2133)
  line L4 (-22.9133, -42.2133) -> (-22.9121, -61.9155)
  point P0 (25.5, 0)
extrude "Extrusion53" add sketch "Sketch67" against normal blind 6
sketch "Sketch68" plane through (24.35, -62.1597, -48.4041) normal (0, 0.8567227, -0.5157773) x (1, 0, 0)
  point P0 (-24.35, -73.5294)
sketch "Sketch69" plane through (30.35, 0, -25.5) normal (1, 0, 0) x (0, 0, -1)
  point P0 (-25.5, 0)
sketch "Sketch70" plane through (30.35, 0, -25.5) normal (1, 0, 0) x (0, 0, -1)
  line L0 (22.9121, -61.9155) -> (23.523, -43.3366) projected
  line L1 (23.523, -43.3366) -> (22.9041, -62.1597) projected
  line L2 (22.9121, -61.9155) -> (22.9041, -62.1597)
  line L3 (22.9041, -62.1597) -> (22.9133, -62.1652)
  line L4 (22.9133, -62.1652) -> (22.9121, -61.9155)
  point P0 (-25.5, 0)
  point P1 (22.9133, -77.85)
extrude "Extrusion54" add sketch "Sketch70" against normal blind 6
sketch "Sketch71" plane through (-34.15, -77.85, 24.5) normal (0, 0, 1) x (1, 0, 0)
  line L0 (0, 0) -> (0, 83.85) projected
  line L1 (0, 83.85) -> (0, 77.85)
  line L2 (64.5, 83.85) -> (64.5, 77.85) projected
  line L3 (0, 83.85) -> (64.5, 83.85)
  line L4 (64.5, 83.85) -> (64.5, 77.85)
  line L5 (64.5, 77.85) -> (0, 77.85)
  line L6 (64.5, 83.85) -> (64.5, 0)
  line L7 (64.5, 0) -> (58.5, 0)
  line L8 (58.5, 0) -> (58.5, 83.85)
  line L9 (0, 77.85) -> (58.5, 0)
  line L10 (58.5, 0) -> (62.7426, 4.2426)
  line L11 (58.5, 0) -> (64.5, 0) construction
  line L12 (0, 77.85) -> (4.2426, 82.0926)
  line L13 (0, 77.85) -> (6, 77.85) construction
  line L14 (4.2426, 82.0926) -> (62.7426, 4.2426)
  line L15 (0, 77.85) -> (0, 0)
  line L16 (58.5, 0) -> (0, 0)
  point P0 (34.15, 77.85)
  point P1 (7.4308, 77.85)
  point P2 (58.5, 9.8886)
  point P3 (58.5, 77.85)
  dimension "d177" = 6
  dimension "d178" = 6
  dimension "d179" = 45
  dimension "d180" = 6
  dimension "d181" = 45
extrude "Extrusion55" cut sketch "Sketch71" against normal blind 6 contours L5 L8 L14
extrude "Extrusion56" cut sketch "Sketch71" against normal blind 6 contours L0 L9 L16
sketch "Sketch72" plane through (-25.65, -77.85, -50.5) normal (0, -1, 0) x (1, 0, 0)
  line L0 (50, -18) -> (50, 1.477) projected
  line L1 (18, -18) -> (50, -18) projected
  line L2 (50, 1.477) -> (18, -18)
  line L3 (50, 75) -> (50, 69) projected
  line L4 (50, 69) -> (0, 0)
  line L5 (0, 0) -> (-27.3378, 0)
  line L6 (0, 47.0139) -> (0, 0) projected
  line L7 (-27.3378, 0) -> (-27.3378, 69)
  line L8 (-27.3378, 69) -> (50, 69)
  line L9 (50, 1.477) -> (75.3518, 1.477)
  line L10 (75.3518, 1.477) -> (75.3518, -41.3346)
  line L11 (75.3518, -41.3346) -> (14.5595, -36.9915)
  line L12 (14.5595, -36.9915) -> (18, -18)
  point P0 (25.65, 50.5)
extrude "Extrusion57" cut sketch "Sketch72" against normal blind 6
fillet "Fillet10" radius 10 2 edges at (-25.65, -74.85, -50.5) (-7.65, -74.85, -68.5)
sketch "Sketch73" plane through (-34.15, 6, 24.5) normal (0, 0, 1) x (1, 0, 0)
  line L0 (0, -5.9793) -> (12, -6)
  line L1 (58.5, -6) -> (0, -6) projected
  line L2 (64.5, -83.85) -> (58.5, -83.85) projected
  line L3 (64.5, -83.85) -> (52.5, -83.85)
  line L4 (29.4334, -83.85) -> (58.5, -83.85) projected
  line L5 (52.5, -83.85) -> (0, -6)
  line L6 (12, -6) -> (64.5, -83.85)
  line L7 (64.5, 0) -> (64.5, -83.85) projected
  line L8 (64.5, 0) -> (52.5, 0)
  line L9 (43.3, 0) -> (55.3, 0) projected
  line L10 (52.5, 0) -> (52.5, -83.85)
  line L11 (64.5, -83.85) -> (64.5, 0)
  point P0 (34.15, -6)
  point P1 (0, -5.9793)
  point P2 (52.5, -66.0557)
  dimension "d189" = 12
  dimension "d190" = 12
  dimension "d191" = 12
extrude "Extrusion58" add sketch "Sketch73" against normal blind 6 contours L6 L10 L5 L1 | L10 L8 L7 L6 | L6 L2 L3 L10
sketch "Sketch74" plane through (24.3221, -77.85, -48.4133) normal (0, -1, 0) x (1, 0, 0)
  line L0 (-5.9721, 66.9133) -> (-5.9721, 72.9133) projected
  arc A0 (-47.6253, 1.1519) -> (-48.9724, -8.0022) centre (-39.5278, -4.7158) ccw projected
  line L1 (-5.9721, 66.9133) -> (-47.6253, 1.1519)
  line L2 (-47.6253, 1.1519) -> (2.7458, 61.3913)
  line L3 (2.7458, 61.3913) -> (2.7458, 69.1583)
  line L4 (2.7458, 69.1583) -> (-5.9721, 66.9133)
  point P0 (-24.3221, 48.4133)
sketch "Sketch75" plane through (24.3221, -77.85, -48.4133) normal (0, -1, 0) x (1, 0, 0)
  line L0 (0.0279, 66.9133) -> (-5.9721, 66.9133) projected
  line L1 (0.0279, 66.9133) -> (-58.6081, 66.9133)
  line L2 (-58.6081, 66.9133) -> (-58.6081, -36.0072)
  line L3 (-58.6081, -36.0072) -> (0.0279, -36.0072)
  line L4 (0.0279, -36.0072) -> (0.0279, 66.9133)
  line L5 (-58.6081, -14.2867) -> (-22.1551, -14.2867)
  line L6 (-22.1551, -14.2867) -> (0.0279, -0.0031)
  line L7 (0.0279, -0.0031) -> (0.0279, 66.9133)
  line L8 (-58.6081, -14.2867) -> (-58.6081, 22.9494)
  line L9 (-58.6081, -14.2867) -> (-22.1551, -14.2867)
  line L10 (-58.6081, 22.1663) -> (-58.6081, -14.2867)
  line L11 (-58.6081, 22.1663) -> (0.0279, 66.9133)
extrude "Extrusion59" add sketch "Sketch75" against normal blind 6 contours L4 L6 L5 L2 L11
extrude "Extrusion60" cut sketch "Sketch75" against normal blind 6 contours L11 L2 L1 L0 | L4 L3 L2 L5 L6
sketch "Sketch76" plane through (30.35, -77.85, -48.4133) normal (0, -1, 0) x (1, 0, 0)
  line L0 (-6, 66.9133) -> (-12, 66.9133) projected
  line L1 (-6, 66.9133) -> (-12, 66.9133)
  line L2 (-64.6359, 22.1663) -> (-6, 66.9133) projected
  line L3 (-12, 66.9133) -> (-64.6359, 22.1663)
  line L4 (-64.6359, 22.1663) -> (-6, 66.9133)
  point P0 (-30.35, 48.4133)
extrude "Extrusion61" add sketch "Sketch76" against normal blind 6
sketch "Sketch77" plane through (30.35, -77.85, -48.4133) normal (0, -1, 0) x (1, 0, 0)
  point P0 (-30.35, 48.4133)
sketch "Sketch78" plane through (30.35, -77.85, -48.4133) normal (0, -1, 0) x (1, 0, 0)
  line L0 (-64.5, 72.9133) -> (-43, 72.9133)
  line L1 (-43, 72.9133) -> (-43, 5.4133)
  line L2 (-43, 5.4133) -> (-64.5, 5.4133)
  line L3 (-64.5, 5.4133) -> (-64.5, 72.9133)
  circle A0 centre (-43, 5.4133) radius 2.7
  point P0 (-30.35, 48.4133)
  dimension "d203" = 21.5
  dimension "d204" = 67.5
  dimension "d205" = 5.4
extrude "Extrusion62" cut sketch "Sketch78" against normal blind 10 contours A0 L2 L1 | L1 L2 A0
sketch "Sketch79" plane through (30.35, -77.85, -48.4133) normal (0, -1, 0) x (1, 0, 0)
  circle A0 centre (-43, 5.4133) radius 2.7 projected
  line L0 (-43, 5.4133) -> (-58, 5.4133)
  line L1 (-58, 5.4133) -> (-58, -9.5867)
  line L2 (-58, -9.5867) -> (-43, -9.5867)
  line L3 (-43, -9.5867) -> (-43, 5.4133)
  line L4 (-6, -0.0031) -> (-28.183, -14.2867) projected
  line L5 (-43, 5.4133) -> (-20.8837, 5.4133)
  line L6 (-20.8837, 5.4133) -> (-20.8837, -9.5867)
  line L7 (-20.8837, -9.5867) -> (-43, -9.5867)
  line L8 (-43, -9.5867) -> (-43, 5.4133)
  line L9 (-43, 5.4133) -> (-58, 5.4133)
  line L10 (-58, 5.4133) -> (-58, 20.4133)
  line L11 (-58, 20.4133) -> (-43, 20.4133)
  line L12 (-43, 20.4133) -> (-43, 5.4133)
  line L13 (-6, 66.9133) -> (-12, 66.9133) projected
  line L14 (-58, 20.4133) -> (-12, 66.9133)
  line L15 (-20.8837, -9.5867) -> (-19.2086, -25.0375)
  line L16 (-19.2086, -25.0375) -> (-82.6089, -27.6328)
  line L17 (-82.6089, -27.6328) -> (-82.6089, 32.6161)
  line L18 (-82.6089, 32.6161) -> (-12, 66.9133)
  point P0 (-30.35, 48.4133)
  dimension "d208" = 15
  dimension "d209" = 15
  dimension "d210" = 15
  dimension "d211" = 15
extrude "Extrusion63" cut sketch "Sketch79" against normal blind 10 contours L7 L15 L16 L17 L18 L14 L10 L1 L2
extrude "Extrusion64" cut sketch "Sketch57" against normal blind 20
sketch "Sketch80" plane through (30.35, -77.85, -48.4133) normal (0, -1, 0) x (1, 0, 0)
  line L0 (-60.7, 7.8729) -> (-60.7, -12.2867)
  line L1 (-60.7, -12.2867) -> (-37.5528, -12.2867)
  line L2 (-6, 24.0093) -> (-6, 66.9133)
  line L3 (-6, 66.9133) -> (-12.2668, 66.9133)
  circle A0 centre (-43, 5.4133) radius 2.7
  circle A1 centre (-43, 5.4133) radius 2.7
  line L4 (-58, 20.4133) -> (-12, 66.9133) projected
  line L5 (-6, 66.9133) -> (-6, 22.9133) projected
  line L6 (-12, 66.9133) -> (-6, 66.9133)
  line L7 (-6, 66.9133) -> (-6, -0.3604)
  circle A2 centre (-43, 5.4133) radius 2.7 projected
  circle A3 centre (-43, 5.4133) radius 2.7
  line L8 (-6, 22.9133) -> (-64.5, 22.9133) projected
  line L9 (-6, 22.9133) -> (-37.5528, -12.2867)
  line L10 (-60.7, 7.8729) -> (-12, 66.9133)
  line L11 (-6, 66.9133) -> (-99.5345, 66.9133)
  line L12 (-99.5345, 66.9133) -> (-99.5345, -44.4669)
  line L13 (-99.5345, -44.4669) -> (-6, -44.4669)
  line L14 (-6, -44.4669) -> (-6, 66.9133)
  point P0 (-19.7017, 74.4527)
  point P1 (-33.15, 48.4133)
  point P2 (-6, 22.9133)
  point P3 (-48.2938, 22.9133)
extrude "Extrusion65" cut sketch "Sketch80" against normal blind 6 contours L0 L1 L9 L7 L14 L13 L12 L11 L3 L4 L8 L10 | L8 L4 L10
extrude "Extrusion66" add sketch "Sketch80" against normal blind 6 contours L10 L8 L9 L1 L0
properties part number "DC23[i3][L][T1]" material "Aluminio 6061"
